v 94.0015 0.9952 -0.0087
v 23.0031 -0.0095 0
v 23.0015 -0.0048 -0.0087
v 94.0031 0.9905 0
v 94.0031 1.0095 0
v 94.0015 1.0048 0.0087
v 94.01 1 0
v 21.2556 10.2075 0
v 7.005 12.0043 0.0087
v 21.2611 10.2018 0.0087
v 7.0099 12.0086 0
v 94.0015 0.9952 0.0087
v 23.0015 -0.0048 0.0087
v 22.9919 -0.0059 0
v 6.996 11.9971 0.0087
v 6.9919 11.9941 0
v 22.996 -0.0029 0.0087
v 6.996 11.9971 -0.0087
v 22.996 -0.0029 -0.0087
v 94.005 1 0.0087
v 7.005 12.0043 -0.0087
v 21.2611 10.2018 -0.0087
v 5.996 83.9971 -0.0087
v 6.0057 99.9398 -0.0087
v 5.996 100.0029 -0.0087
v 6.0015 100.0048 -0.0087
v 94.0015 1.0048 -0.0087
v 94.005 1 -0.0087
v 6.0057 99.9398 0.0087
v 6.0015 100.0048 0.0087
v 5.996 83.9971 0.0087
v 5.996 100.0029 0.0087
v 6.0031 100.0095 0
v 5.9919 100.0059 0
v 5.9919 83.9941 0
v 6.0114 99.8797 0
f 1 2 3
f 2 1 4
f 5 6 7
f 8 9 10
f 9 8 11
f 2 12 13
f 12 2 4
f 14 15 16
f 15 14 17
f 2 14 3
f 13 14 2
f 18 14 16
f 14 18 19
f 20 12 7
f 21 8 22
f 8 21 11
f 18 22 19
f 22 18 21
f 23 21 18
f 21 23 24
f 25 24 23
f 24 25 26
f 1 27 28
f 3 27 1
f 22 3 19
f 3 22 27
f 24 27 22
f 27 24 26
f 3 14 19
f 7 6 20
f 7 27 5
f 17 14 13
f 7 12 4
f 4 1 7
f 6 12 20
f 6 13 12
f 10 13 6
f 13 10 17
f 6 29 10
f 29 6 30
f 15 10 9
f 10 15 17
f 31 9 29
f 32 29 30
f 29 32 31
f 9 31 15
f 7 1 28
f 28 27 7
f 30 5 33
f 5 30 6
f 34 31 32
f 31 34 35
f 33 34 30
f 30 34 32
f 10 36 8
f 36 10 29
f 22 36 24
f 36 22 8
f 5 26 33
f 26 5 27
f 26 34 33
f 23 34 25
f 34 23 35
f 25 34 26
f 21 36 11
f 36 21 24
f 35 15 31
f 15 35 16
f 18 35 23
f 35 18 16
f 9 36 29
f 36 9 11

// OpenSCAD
color([0.45760594266221877,0.8933837090972113,0.8109172526149769]) hull(){
    translate([23,0]) sphere(0.01);
    translate([7,12]) sphere(0.01);
    translate([94,1]) sphere(0.01);
}
color([0.14833972802097417,0.6068004170768148,0.5080529466064481]) hull(){
    translate([23,0]) sphere(0.01);
    translate([94,1]) sphere(0.01);
    translate([6,100]) sphere(0.01);
}
color([0.9906187087676633,0.11352393843166497,0.6883720652754897]) hull(){
    translate([7,12]) sphere(0.01);
    translate([6,100]) sphere(0.01);
    translate([6,84]) sphere(0.01);
}
